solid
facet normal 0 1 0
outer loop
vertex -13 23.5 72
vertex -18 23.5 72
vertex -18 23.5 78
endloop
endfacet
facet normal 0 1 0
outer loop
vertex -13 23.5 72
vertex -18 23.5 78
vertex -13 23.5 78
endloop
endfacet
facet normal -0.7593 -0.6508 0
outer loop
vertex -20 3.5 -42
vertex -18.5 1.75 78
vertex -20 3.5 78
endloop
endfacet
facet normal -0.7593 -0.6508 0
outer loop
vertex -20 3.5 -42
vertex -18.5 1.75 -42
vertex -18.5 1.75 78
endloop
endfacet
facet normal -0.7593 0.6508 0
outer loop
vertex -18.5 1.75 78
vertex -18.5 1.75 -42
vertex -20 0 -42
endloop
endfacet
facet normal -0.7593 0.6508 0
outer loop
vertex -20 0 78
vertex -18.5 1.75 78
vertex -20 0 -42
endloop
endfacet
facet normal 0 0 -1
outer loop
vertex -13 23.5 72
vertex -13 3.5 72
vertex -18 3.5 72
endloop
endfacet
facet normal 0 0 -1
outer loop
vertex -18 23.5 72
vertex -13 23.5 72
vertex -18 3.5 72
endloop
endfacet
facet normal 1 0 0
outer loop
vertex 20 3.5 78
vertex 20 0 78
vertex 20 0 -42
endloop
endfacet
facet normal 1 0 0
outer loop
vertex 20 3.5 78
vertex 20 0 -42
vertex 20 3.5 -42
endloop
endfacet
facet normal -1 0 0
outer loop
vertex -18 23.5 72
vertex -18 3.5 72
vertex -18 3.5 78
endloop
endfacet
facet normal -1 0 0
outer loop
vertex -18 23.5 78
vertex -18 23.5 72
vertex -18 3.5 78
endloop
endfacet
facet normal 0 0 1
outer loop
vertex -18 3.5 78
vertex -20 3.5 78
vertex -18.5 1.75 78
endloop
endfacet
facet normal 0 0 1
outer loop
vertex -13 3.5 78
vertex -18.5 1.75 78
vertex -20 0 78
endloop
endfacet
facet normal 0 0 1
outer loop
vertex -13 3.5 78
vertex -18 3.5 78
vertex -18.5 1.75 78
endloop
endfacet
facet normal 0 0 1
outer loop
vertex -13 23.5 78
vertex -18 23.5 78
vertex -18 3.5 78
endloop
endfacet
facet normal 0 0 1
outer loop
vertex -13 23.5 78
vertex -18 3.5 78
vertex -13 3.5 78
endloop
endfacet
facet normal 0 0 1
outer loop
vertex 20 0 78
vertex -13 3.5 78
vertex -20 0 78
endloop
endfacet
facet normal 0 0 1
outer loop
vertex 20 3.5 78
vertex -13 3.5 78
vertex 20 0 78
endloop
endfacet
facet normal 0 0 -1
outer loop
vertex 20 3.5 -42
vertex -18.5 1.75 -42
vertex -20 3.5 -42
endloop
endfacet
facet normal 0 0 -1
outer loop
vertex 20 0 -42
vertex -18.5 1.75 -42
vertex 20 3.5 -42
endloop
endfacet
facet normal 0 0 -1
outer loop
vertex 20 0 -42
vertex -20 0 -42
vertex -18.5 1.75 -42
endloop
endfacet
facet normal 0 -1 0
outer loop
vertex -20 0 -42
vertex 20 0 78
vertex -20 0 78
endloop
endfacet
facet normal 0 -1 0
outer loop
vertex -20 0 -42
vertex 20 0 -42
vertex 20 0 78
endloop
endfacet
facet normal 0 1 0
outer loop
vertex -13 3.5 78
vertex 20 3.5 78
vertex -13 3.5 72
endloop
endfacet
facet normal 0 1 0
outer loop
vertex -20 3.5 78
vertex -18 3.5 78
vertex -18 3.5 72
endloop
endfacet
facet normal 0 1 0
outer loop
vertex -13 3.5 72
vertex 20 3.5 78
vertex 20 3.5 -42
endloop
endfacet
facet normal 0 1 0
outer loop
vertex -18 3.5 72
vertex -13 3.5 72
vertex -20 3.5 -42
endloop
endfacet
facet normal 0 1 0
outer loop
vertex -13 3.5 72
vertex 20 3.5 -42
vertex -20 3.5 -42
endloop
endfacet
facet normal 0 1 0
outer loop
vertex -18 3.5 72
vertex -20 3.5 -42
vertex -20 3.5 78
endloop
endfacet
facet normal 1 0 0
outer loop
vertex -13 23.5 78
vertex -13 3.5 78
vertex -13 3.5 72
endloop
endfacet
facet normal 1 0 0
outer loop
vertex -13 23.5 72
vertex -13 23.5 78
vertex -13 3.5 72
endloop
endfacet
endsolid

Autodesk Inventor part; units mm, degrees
ref_plane "YZ Plane" through (0, 0, 0) normal (1, 0, 0) x (0, 1, 0)
ref_plane "XZ Plane" through (0, 0, 0) normal (0, 1, 0) x (-1, 0, 0)
ref_plane "XY Plane" through (0, 0, 0) normal (0, 0, 1) x (1, 0, 0)
sketch "Sketch1" plane through (0, 0, 0) normal (0, 1, 0) x (-1, 0, 0)
  line L0 (-20, 42) -> (20, 42)
  line L1 (20, 42) -> (20, -42)
  line L2 (20, -42) -> (-20, -42)
  line L3 (-20, -42) -> (-20, 42)
  point P0 (0, 0)
  dimension "d0" = 40
  dimension "d1" = 84
  dimension "d2" = 20
  dimension "d3" = 42
extrude "Extrusion1" add sketch "Sketch1" along normal blind 3.5
sketch "Sketch3" plane through (20, 0, -42) normal (0, 0, -1) x (-1, 0, 0)
  line L0 (40, 0) -> (40, 3.5) projected
  line L1 (0, 3.5) -> (40, 3.5) projected
  line L2 (40, 0) -> (38.5, 0)
  line L3 (38.5, 0) -> (38.5, 3.5)
  line L4 (38.5, 3.5) -> (40, 3.5)
  line L5 (40, 3.5) -> (40, 0)
  line L6 (0, 0) -> (40, 0) projected
  line L7 (40, 0) -> (38.5, 1.75)
  line L8 (40, 3.5) -> (38.5, 1.75)
  point P0 (20, 0)
  dimension "d10" = 1.5
extrude "Extrusion2" cut sketch "Sketch3" against normal blind 127.5 contours L7 L8 L0
sketch "Sketch4" plane through (0, 3.5, 0) normal (0, 1, 0) x (1, 0, 0)
  point P0 (0, 0)
sketch "Sketch5" plane through (20, 0, 42) normal (0, 0, 1) x (1, 0, 0)
  line L0 (0, 3.5) -> (-40, 3.5) projected
  line L1 (0, 0) -> (-40, 0) projected
  line L2 (0, 3.5) -> (-40, 3.5)
  line L3 (-40, 3.5) -> (-40, 0)
  line L4 (-40, 0) -> (0, 0)
  line L5 (0, 0) -> (0, 3.5)
  line L6 (-38.5, 1.75) -> (-40, 0) projected
  line L7 (-40, 0) -> (-38.5, 1.75)
  line L8 (-38.5, 1.75) -> (-40, 3.5) projected
  line L9 (-38.5, 1.75) -> (-40, 3.5)
  point P0 (-20, 0)
extrude "Extrusion3" add sketch "Sketch5" along normal blind 36 contours L5 L1 L6 L8 L0
sketch "Sketch6" plane through (0, 3.5, 0) normal (0, 1, 0) x (1, 0, 0)
  point P0 (0, 0)
sketch "Sketch7" plane through (0, 3.5, 0) normal (0, 1, 0) x (1, 0, 0)
  line L0 (-20, 42) -> (-20, -78) projected
  line L1 (-20, -78) -> (-13, -78)
  line L2 (-13, -78) -> (-13, -72)
  line L3 (-13, -72) -> (-20, -72)
  line L4 (-20, -72) -> (-20, -78)
  line L5 (-20, -78) -> (20, -78) projected
  line L6 (-20, -72) -> (-18, -72)
  line L7 (-18, -72) -> (-18, -78)
  line L8 (-18, -78) -> (-20, -78)
  line L9 (-20, -78) -> (-20, -72)
  point P0 (0, 0)
  dimension "d15" = 7
  dimension "d16" = 6
extrude "Extrusion4" add sketch "Sketch7" along normal blind 20 contours L3 L2 L1 L7
equation "\"d2\" = 0.5 * d0"
equation "\"d3\" = 0.5 * d1"
equation "\"BendRadius\" = Thickness"
equation "\"BendReliefWidth\" = Thickness"
equation "\"BendReliefDepth\" = 0.5 * Thickness"
equation "\"CornerReliefSize\" = 4 * Thickness"
equation "\"MinimumRemnant\" = 2 * Thickness"
equation "\"TransitionRadius\" = BendRadius"
equation "\"JacobiRadiusSize\" = BendRadius"
equation "\"GapSize\" = Thickness"
equation "\"Thickness\" = 0.5"
properties part number "modelGateGate"
